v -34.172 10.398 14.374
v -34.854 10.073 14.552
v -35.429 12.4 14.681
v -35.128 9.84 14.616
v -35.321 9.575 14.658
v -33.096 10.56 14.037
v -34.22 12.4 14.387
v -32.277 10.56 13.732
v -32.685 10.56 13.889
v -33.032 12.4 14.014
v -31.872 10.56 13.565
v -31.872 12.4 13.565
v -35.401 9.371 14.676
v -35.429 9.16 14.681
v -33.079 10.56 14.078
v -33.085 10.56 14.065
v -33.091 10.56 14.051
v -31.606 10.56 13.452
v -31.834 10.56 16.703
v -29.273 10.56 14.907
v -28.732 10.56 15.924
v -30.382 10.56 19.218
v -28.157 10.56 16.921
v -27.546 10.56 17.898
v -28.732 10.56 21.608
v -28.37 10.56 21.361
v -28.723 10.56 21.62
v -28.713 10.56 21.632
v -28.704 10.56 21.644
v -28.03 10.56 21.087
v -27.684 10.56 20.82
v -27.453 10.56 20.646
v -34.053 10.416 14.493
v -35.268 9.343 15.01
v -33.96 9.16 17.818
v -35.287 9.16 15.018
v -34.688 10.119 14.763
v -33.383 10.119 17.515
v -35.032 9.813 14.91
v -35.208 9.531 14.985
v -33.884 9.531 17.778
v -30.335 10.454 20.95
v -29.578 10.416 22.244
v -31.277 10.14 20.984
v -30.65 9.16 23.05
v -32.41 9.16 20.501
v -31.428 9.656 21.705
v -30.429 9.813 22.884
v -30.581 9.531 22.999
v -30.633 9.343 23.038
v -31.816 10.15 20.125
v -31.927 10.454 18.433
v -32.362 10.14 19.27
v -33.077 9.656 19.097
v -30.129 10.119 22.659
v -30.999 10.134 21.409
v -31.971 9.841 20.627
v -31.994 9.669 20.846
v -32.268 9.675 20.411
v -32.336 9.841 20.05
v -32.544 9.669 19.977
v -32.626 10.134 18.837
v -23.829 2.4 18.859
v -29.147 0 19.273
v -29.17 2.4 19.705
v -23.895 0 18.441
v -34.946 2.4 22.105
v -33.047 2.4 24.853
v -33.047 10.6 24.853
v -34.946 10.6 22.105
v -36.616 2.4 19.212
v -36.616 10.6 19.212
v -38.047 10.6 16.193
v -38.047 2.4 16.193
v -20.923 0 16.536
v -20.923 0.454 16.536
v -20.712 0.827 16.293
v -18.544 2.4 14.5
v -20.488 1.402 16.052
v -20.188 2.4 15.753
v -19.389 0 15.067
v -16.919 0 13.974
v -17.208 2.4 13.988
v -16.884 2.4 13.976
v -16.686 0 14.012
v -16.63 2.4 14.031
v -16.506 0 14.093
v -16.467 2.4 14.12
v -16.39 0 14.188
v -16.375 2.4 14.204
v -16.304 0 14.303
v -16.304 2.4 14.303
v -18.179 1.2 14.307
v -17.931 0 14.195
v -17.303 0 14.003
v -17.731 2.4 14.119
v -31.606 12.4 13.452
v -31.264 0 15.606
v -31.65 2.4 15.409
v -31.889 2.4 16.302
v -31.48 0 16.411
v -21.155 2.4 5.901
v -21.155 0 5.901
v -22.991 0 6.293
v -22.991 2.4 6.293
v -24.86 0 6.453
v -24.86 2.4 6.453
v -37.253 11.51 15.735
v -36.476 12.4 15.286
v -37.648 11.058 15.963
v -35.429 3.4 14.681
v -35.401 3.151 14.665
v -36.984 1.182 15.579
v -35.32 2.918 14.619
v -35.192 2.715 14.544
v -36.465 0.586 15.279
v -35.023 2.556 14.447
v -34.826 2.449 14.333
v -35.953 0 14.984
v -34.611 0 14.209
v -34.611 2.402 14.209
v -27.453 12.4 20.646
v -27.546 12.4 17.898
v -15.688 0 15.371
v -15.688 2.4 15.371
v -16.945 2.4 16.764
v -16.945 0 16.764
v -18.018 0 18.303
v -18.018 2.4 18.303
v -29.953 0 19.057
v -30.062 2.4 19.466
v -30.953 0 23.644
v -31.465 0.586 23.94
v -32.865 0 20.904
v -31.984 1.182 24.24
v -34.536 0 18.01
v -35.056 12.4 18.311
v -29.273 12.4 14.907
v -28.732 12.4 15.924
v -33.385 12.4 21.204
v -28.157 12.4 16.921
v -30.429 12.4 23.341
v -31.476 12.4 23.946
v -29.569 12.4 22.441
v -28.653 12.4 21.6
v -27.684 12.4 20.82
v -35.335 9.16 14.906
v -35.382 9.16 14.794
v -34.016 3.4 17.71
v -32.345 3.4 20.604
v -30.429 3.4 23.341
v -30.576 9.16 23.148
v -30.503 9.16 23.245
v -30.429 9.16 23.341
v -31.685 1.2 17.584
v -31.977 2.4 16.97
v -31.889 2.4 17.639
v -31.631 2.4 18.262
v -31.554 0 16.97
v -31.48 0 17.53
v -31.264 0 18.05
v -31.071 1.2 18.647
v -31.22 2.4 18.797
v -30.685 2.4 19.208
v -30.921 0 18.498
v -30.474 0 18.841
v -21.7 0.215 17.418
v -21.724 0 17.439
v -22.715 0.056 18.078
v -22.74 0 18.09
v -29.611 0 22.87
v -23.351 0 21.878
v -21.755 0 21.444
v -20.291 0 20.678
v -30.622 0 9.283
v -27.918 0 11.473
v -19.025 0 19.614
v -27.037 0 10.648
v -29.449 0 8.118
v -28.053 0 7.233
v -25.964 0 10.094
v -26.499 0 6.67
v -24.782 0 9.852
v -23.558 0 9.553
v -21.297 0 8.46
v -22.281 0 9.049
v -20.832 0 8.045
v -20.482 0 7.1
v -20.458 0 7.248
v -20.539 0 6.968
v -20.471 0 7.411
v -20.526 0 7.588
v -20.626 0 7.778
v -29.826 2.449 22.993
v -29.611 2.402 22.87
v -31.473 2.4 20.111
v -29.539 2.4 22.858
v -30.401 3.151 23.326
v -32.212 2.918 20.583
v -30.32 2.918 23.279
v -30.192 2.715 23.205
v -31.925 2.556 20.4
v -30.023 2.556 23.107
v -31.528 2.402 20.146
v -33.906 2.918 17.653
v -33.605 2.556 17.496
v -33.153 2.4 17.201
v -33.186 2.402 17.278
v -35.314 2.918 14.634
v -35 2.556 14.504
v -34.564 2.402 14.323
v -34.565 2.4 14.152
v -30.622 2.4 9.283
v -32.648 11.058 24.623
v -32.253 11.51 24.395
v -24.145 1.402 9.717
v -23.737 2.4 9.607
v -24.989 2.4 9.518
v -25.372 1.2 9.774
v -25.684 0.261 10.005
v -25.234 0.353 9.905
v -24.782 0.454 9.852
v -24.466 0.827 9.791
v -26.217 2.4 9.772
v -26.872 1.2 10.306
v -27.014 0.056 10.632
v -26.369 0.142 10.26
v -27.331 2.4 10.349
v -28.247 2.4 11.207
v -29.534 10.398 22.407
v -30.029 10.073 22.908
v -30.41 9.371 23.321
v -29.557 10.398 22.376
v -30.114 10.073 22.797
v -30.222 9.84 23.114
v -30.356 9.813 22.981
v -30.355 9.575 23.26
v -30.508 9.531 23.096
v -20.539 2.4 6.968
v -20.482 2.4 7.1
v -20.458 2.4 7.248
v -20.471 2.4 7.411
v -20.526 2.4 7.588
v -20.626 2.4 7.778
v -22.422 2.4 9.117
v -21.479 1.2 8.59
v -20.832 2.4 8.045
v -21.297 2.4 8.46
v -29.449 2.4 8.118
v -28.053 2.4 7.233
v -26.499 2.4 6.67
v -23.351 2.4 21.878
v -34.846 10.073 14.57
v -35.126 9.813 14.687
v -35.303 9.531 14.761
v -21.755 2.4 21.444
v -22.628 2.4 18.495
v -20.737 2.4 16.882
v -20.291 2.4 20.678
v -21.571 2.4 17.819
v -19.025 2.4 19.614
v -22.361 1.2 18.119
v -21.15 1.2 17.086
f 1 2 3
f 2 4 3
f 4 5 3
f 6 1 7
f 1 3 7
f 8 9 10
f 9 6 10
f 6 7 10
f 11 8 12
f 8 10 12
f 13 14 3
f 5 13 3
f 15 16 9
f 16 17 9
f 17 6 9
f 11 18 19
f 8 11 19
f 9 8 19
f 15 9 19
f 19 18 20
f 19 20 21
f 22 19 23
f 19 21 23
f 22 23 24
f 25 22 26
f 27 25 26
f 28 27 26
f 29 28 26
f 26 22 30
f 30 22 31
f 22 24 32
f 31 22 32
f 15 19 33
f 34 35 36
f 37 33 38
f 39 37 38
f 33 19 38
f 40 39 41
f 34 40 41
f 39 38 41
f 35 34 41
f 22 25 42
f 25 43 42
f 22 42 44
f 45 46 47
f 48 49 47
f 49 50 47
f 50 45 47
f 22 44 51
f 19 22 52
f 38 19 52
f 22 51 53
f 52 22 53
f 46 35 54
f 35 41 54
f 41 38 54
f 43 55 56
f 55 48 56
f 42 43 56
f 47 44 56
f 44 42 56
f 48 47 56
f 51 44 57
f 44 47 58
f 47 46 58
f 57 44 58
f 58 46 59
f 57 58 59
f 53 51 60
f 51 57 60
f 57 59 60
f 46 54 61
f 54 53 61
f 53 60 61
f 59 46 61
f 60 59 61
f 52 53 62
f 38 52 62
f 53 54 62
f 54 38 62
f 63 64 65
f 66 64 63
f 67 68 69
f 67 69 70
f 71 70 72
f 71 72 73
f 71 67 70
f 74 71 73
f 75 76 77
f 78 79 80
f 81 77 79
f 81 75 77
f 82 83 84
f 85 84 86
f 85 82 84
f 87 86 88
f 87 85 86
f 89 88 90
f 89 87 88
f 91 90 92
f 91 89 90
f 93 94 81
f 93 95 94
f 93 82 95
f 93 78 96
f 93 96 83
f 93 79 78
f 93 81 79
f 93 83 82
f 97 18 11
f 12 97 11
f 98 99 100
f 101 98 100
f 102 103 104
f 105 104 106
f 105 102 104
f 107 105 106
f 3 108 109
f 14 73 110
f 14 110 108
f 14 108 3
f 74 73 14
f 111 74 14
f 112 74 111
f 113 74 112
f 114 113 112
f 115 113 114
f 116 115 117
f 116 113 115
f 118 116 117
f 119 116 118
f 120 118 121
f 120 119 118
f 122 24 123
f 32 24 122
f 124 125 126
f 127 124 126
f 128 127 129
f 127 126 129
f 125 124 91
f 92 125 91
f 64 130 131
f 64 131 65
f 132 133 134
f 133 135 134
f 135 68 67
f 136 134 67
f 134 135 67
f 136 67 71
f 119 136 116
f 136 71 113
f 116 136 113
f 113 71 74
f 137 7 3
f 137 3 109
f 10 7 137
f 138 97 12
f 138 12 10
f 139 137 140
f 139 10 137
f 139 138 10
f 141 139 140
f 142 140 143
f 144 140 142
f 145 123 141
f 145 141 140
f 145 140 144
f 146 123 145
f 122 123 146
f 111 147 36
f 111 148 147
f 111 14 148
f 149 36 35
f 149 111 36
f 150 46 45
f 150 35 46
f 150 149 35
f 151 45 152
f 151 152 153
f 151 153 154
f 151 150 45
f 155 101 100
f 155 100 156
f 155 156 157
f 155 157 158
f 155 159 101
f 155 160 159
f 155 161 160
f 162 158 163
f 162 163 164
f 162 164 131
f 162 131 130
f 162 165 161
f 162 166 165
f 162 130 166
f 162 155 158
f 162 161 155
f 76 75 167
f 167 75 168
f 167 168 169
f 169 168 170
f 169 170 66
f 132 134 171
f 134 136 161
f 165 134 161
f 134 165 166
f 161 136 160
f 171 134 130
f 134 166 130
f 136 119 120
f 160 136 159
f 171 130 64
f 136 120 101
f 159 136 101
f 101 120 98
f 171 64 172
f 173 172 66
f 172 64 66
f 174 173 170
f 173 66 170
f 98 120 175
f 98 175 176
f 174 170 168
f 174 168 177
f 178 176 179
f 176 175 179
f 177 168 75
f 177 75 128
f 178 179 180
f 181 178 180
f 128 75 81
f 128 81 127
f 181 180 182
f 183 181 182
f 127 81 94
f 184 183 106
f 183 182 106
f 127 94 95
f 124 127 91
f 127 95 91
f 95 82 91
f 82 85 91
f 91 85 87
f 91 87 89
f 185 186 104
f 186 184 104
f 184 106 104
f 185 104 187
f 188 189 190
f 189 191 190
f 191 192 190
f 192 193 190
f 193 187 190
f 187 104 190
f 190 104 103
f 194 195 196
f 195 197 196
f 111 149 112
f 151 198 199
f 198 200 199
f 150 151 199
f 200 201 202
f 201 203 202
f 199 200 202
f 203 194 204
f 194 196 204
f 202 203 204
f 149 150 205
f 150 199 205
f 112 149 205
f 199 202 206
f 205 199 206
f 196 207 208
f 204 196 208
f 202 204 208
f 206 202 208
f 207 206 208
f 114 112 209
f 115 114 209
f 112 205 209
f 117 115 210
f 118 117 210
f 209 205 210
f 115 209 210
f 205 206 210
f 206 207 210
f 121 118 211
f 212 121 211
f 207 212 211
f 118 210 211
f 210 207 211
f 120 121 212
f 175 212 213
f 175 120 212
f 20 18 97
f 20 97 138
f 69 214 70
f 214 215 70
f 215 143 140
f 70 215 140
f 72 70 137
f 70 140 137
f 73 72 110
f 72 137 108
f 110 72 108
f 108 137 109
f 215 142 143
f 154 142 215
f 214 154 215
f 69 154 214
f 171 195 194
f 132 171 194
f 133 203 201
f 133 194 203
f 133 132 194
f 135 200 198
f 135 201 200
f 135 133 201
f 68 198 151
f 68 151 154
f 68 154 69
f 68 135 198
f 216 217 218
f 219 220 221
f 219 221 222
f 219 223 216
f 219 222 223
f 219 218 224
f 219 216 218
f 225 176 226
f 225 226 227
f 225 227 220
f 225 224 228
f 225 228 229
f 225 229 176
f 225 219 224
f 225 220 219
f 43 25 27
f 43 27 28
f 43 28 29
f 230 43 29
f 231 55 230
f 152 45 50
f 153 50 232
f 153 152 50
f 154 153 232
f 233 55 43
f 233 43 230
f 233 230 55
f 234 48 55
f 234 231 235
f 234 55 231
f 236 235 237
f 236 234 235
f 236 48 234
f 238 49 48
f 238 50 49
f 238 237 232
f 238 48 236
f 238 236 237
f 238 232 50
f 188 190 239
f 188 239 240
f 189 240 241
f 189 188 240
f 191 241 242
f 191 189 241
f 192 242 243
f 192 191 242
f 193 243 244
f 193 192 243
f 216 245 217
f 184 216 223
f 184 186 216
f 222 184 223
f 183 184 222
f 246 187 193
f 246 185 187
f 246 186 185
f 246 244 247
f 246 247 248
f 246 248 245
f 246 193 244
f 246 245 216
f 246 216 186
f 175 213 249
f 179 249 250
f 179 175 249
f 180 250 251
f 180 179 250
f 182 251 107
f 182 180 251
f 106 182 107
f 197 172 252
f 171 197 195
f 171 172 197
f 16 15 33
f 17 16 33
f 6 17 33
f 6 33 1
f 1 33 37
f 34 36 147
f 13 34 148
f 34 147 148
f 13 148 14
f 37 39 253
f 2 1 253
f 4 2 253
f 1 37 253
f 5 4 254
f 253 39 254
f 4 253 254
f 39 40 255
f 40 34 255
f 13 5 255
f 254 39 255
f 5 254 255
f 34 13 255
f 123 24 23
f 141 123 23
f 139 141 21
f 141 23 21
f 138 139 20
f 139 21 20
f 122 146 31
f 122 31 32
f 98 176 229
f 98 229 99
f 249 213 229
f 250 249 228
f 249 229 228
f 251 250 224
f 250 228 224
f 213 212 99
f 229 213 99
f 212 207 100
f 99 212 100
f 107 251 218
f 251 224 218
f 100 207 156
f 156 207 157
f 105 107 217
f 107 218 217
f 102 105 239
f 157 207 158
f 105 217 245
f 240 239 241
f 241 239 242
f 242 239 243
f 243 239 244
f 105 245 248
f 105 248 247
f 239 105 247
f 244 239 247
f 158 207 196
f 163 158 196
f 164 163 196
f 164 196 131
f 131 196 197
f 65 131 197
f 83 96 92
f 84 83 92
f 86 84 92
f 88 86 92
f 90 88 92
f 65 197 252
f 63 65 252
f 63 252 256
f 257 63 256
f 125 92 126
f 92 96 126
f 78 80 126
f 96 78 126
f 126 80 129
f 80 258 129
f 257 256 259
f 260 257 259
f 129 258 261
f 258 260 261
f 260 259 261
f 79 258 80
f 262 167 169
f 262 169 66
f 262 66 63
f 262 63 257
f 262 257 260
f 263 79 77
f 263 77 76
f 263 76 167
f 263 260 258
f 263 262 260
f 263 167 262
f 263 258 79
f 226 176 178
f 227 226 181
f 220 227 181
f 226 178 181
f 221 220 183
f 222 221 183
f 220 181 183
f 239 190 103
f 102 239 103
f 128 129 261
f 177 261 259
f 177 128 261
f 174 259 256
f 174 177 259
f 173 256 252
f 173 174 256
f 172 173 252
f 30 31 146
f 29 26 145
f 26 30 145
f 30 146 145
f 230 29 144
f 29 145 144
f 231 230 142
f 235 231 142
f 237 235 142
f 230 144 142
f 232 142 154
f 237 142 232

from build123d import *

# Parameters (mm, degrees)
EXTRUDE_1_DEPTH     = 2.4
EXTRUDE_1_DRAFT     = 10.000000000000021
EXTRUDE_2_DEPTH     = 12.4
EXTRUDE_4_DEPTH     = 2.4
EXTRUDE_START       = -1.84
EXTRUDE_3_DEPTH     = 1.84
CHAMFER_1_SIZE      = 2.4
FILLET_3_R          = 1
FILLET_4_R          = 19
CHAMFER_2_SIZE      = 1.5
CHAMFER_3_SIZE      = 1.5
FILLET_5_SIZE       = 2.4
FILLET_5_SIZE_2     = 1.4
FILLET_8_R          = 15
CUT_EXTRUDE_2_DEPTH = 5
FILLET_6_DEPTH      = 2.4
FILLET_7_DEPTH      = 2.4
CHAMFER_4_SIZE      = 1.8


with BuildPart() as part:
    # 草图1 → 凸台-拉伸1 (with draft: the straight prism first)
    with BuildSketch(Plane(origin=(0, 0, 0), x_dir=(1, 0, 0), z_dir=(0, 1, 0))):
        with BuildLine():
            Line((-8, -10.39230484541326), (-13.000000000000005, -1.7320508075688719))
            Line((-13.000000000000005, -1.7320508075688719), (-21.967816979362475, -6.909622354647092))
            Line((-21.967816979362475, -6.909622354647092), (-22.707399570917065, -6.711454425652112))
            ThreePointArc((-22.707399570917065, -6.711454425652112), (-27.04566788326862, -6.825066693061728), (-30.6221750608845, -9.283130179980438))
            Line((-30.6221750608845, -9.283130179980438), (-34.43427486961312, -13.990668154170681))
            Line((-34.43427486961312, -13.990668154170681), (-34.61139932518726, -14.209398025530225))
            Line((-34.61139932518726, -14.209398025530225), (-35.428587503869785, -14.681201840470763))
            ThreePointArc((-35.428587503869785, -14.681201840470763), (-33.21207423513341, -19.174999999999695), (-30.428587503869863, -23.341455878315195))
            Line((-30.428587503869863, -23.341455878315195), (-29.611399325157414, -22.86965206335739))
            Line((-29.611399325157414, -22.86965206335739), (-29.333411472153603, -22.825622720870605))
            Line((-29.333411472153603, -22.825622720870605), (-23.35051542170495, -21.878016642325832))
            ThreePointArc((-23.35051542170495, -21.878016642325832), (-19.4335158344601, -20.009702780252802), (-17.165989990997385, -16.309458328474033))
            Line((-17.165989990997385, -16.309458328474033), (-16.967816979363704, -15.569876392492032))
            Line((-16.967816979363704, -15.569876392492032), (-8, -10.39230484541326))
        make_face()
        with BuildLine():
            Line((-27.917710857810967, -11.473169762795624), (-31.26430328260419, -15.605855608999667))
            Line((-31.26430328260419, -15.605855608999667), (-31.480162480983196, -16.41144743799068))
            ThreePointArc((-31.480162480983196, -16.41144743799068), (-31.264379416774442, -18.05049776957139), (-29.95281180657393, -19.056896658743568))
            Line((-29.95281180657393, -19.056896658743568), (-29.147219046463054, -19.272753069842064))
            Line((-29.147219046463054, -19.272753069842064), (-23.894912087940103, -18.440861965883116))
            ThreePointArc((-23.894912087940103, -18.440861965883116), (-21.762087000118, -17.42355577622036), (-20.527408297941975, -15.40875473364509))
            Line((-20.527408297941975, -15.40875473364509), (-19.958845574370134, -13.286877913181291))
            ThreePointArc((-19.958845574370134, -13.286877913181291), (-20.174626779333174, -11.64782603948194), (-21.486196868626088, -10.641428268238217))
            Line((-21.486196868626088, -10.641428268238217), (-23.608077089277337, -10.072879719767714))
            ThreePointArc((-23.608077089277337, -10.072879719767714), (-25.970285289887677, -10.134742247833366), (-27.917710857810967, -11.473169762795624))
        make_face(mode=Mode.SUBTRACT)
    extrude(amount=EXTRUDE_1_DEPTH)
    # 凸台-拉伸1: the draft: its side faces are tilted about the plane it starts from
    extrude_1_sides = [part.faces().sort_by_distance(p)[0] for p in [
        (-12.48390849, 1.2, 12.981090619),
        (-29.59100707, 1.2, 13.539512686),
        (-31.372232882, 1.2, 16.008651523),
        (-31.264379417, 1.2, 18.05049777),
        (-29.550015427, 1.2, 19.164824864),
        (-26.521065567, 1.2, 18.856807518),
        (-21.762087, 1.2, 17.423555776),
        (-20.243126936, 1.2, 14.347816323),
        (-20.174626779, 1.2, 11.647826039),
        (-22.547136979, 1.2, 10.357153994),
        (-25.97028529, 1.2, 10.134742248),
        (-19.433515834, 1.2, 20.00970278),
        (-26.480957373, 1.2, 22.373834353),
        (-30.019993415, 1.2, 23.105553971),
        (-33.212074235, 1.2, 19.175),
        (-35.019993415, 1.2, 14.445299933),
        (-32.616787193, 1.2, 11.746264103),
        (-27.045667883, 1.2, 6.825066693),
        (-22.337608275, 1.2, 6.81053839),
        (-17.48390849, 1.2, 4.320836581),
        (-10.5, 1.2, 6.062177826),
        (-17.066903485, 1.2, 15.93966736),
    ]]
    draft(extrude_1_sides, Plane(origin=(0, 0, 0), x_dir=(1, 0, 0), z_dir=(0, 1, 0)), EXTRUDE_1_DRAFT)



with BuildPart() as body_2:
    # 草图3 → 凸台-拉伸2 (new body)
    with BuildSketch(Plane.XZ):
        with BuildLine():
            Line((-30.428587503869863, 23.341455878315195), (-33.04738914463361, 24.853421710564383))
            ThreePointArc((-33.04738914463361, 24.853421710564383), (-35.81015044648663, 20.67499999999986), (-38.04738914463341, 16.193167672720275))
            Line((-38.04738914463341, 16.193167672720275), (-35.42858750386978, 14.681201840470765))
            ThreePointArc((-35.42858750386978, 14.681201840470765), (-33.21207423513341, 19.17499999999969), (-30.428587503869863, 23.341455878315195))
        make_face()
    extrude(amount=-EXTRUDE_2_DEPTH)


with BuildPart() as part_1:
    add(part.part)

    add(body_2.part)  # 凸台-拉伸4 merges body 2
    # 草图2 → 凸台-拉伸4 (add)
    with BuildSketch(Plane.XZ):
        with BuildLine():
            Line((-13.000000000000005, 1.7320508075688719), (-8, 10.39230484541326))
            Line((-8, 10.39230484541326), (-16.967816979363704, 15.569876392492032))
            Line((-16.967816979363704, 15.569876392492032), (-17.165989990997385, 16.309458328474033))
            ThreePointArc((-17.165989990997385, 16.309458328474033), (-19.433515834460025, 20.009702780252884), (-23.35051542170494, 21.878016642325914))
            Line((-23.35051542170494, 21.878016642325914), (-29.611399325157414, 22.86965206335739))
            Line((-29.611399325157414, 22.86965206335739), (-30.428587503869863, 23.341455878315195))
            ThreePointArc((-30.428587503869863, 23.341455878315195), (-33.21207423513341, 19.17499999999969), (-35.428587503869785, 14.681201840470749))
            Line((-35.428587503869785, 14.681201840470749), (-34.61139932518726, 14.209398025530225))
            Line((-34.61139932518726, 14.209398025530225), (-30.6221750608845, 9.283130179980438))
            ThreePointArc((-30.6221750608845, 9.283130179980438), (-27.04566788326878, 6.825066693061228), (-22.707399570916962, 6.7114544256517314))
            Line((-22.707399570916962, 6.7114544256517314), (-21.967816979362475, 6.909622354647092))
            Line((-21.967816979362475, 6.909622354647092), (-13.000000000000005, 1.7320508075688719))
        make_face()
        Polygon((-28.267922287633624, 9.69566060346451), (-32.99491205073382, 15.569876392492032), (-31.81295668178173, 19.594100965997992), (-26.34681601079053, 20.919608689289614), (-19.04027200355443, 17.12116385307054), (-18.489608424453053, 9.956624945753184), (-26.729419610491885, 8.295337377312261), align=None, mode=Mode.SUBTRACT)
    extrude(amount=-EXTRUDE_4_DEPTH)

    # 草图4 → 凸台-拉伸3 (add)
    with BuildSketch(Plane(origin=(0, 12.4, 0), x_dir=(1, 0, 0), z_dir=(0, 1, 0)).offset(EXTRUDE_START)):
        with BuildLine():
            Line((-30.226281339811546, -12.864463314361807), (-38.04738914463341, -16.19316767272028))
            ThreePointArc((-38.04738914463341, -16.19316767272028), (-35.81015044648664, -20.674999999999862), (-33.04738914463361, -24.853421710564383))
            Line((-33.04738914463361, -24.853421710564383), (-26.254092706196243, -19.74449584503119))
            ThreePointArc((-26.254092706196243, -19.74449584503119), (-28.4489345143189, -16.424999999999862), (-30.226281339811546, -12.864463314361807))
        make_face()
    extrude(amount=EXTRUDE_3_DEPTH)

    # 倒角1
    chamfer_1_edges = [part_1.edges().sort_by_distance(p)[0] for p in [
        (-35.81015044648664, 0, 20.674999999999848),
    ]]
    chamfer(chamfer_1_edges, length=CHAMFER_1_SIZE)

    # 圆角3
    fillet_3_edges = [part_1.edges().sort_by_distance(p)[0] for p in [
        (-33.21207423513341, 2.4, 19.174999999999685),
    ]]
    fillet(fillet_3_edges, radius=FILLET_3_R)

    # 圆角4
    # the kernel refuses this fillet: 19 mm, written as the material it adds along each edge
    with BuildSketch(Plane(origin=(-30.64975510753807, 12.4, 23.050271405082075), x_dir=(0.6048533830099544, 0, 0.7963368540143131), z_dir=(0, -1, 0))) as fillet_4_piece_1:
        with BuildLine():
            CenterArc((19.01747725145387, -3.620707526685834), FILLET_4_R, 169.01432561321406, 11.258823825178695)
            Line((0.01769316413072922, -3.711286967523243), (0, 0))
            ThreePointArc((0, 0), (0.1828274503215999, 0.00043580269250474), (0.36565490064319695, 1e-17))
        make_face()
    extrude(amount=1.8399999999999999)
    with BuildSketch(Plane(origin=(-35.28699815469627, 12.4, 15.018330840358463), x_dir=(-0.38722125404118524, 0, -0.9219868222587414), z_dir=(0, -1, 0))) as fillet_4_piece_2:
        with BuildLine():
            CenterArc((19.01747725145391, 3.620707526687544), FILLET_4_R, 179.7268505616068, 11.258823825184436)
            Line((0.01769316413076899, 3.7112869675251012), (0, 0))
            ThreePointArc((0, 0), (0.1828274503217857, -0.00043580269250211), (0.36565490064356865, -1e-17))
        make_face()
    extrude(amount=1.8399999999999999)

    # 倒角2
    # the kernel refuses this chamfer: 2.14222201, 1.5 mm, written as the material it takes off along each edge
    with BuildSketch(Plane(origin=(-30.226281339811543, 4.744273175478047, 12.864463314361808), x_dir=(-0.9201303299790425, 0, 0.3916122774539359), z_dir=(0, 1, 0))) as chamfer_2_piece_1:
        with BuildLine():
            Line((CHAMFER_2_SIZE, 1e-17), (-0.07732795533825856, 2.2526577753949484))
            ThreePointArc((-0.07732795533825856, 2.2526577753949484), (-0.02059122506408261, 1.1629357197030856), (0, 0))
            Line((0, 0), (CHAMFER_2_SIZE, 1e-17))
        make_face()
    extrude(amount=13.471453649043909, mode=Mode.SUBTRACT)

    # 倒角3
    # the kernel refuses this chamfer: 2.14222201, 1.5 mm, written as the material it takes off along each edge
    with BuildSketch(Plane(origin=(-26.254092706196246, 4.744273175477979, 19.74449584503119), x_dir=(-0.5732775613281392, 0, -0.8193612375977165), z_dir=(0, 1, 0))) as chamfer_3_piece_1:
        with BuildLine():
            Line((2.253984619673398, -1.7e-16), (-CHAMFER_3_SIZE * 0.0343072240437, CHAMFER_3_SIZE * 0.999411333925))
            Line((-CHAMFER_3_SIZE * 0.0343072240437, CHAMFER_3_SIZE * 0.999411333925), (0, 0))
            ThreePointArc((0, 0), (1.1629575666695002, 0.0193179925758491), (2.253984619673398, -1.7e-16))
        make_face()
    extrude(amount=13.471453649044044, mode=Mode.SUBTRACT)

    # 圆角5
    # a fillet whose section is not a circle: 2.4, 1.4 mm, written as the material it adds along each edge
    with BuildSketch(Plane(origin=(-2.0606e-13, 10.56, 1.3323e-13), x_dir=(-0.7992113456985149, 0, 0.601050101827434), z_dir=(0.601050101827434, 0, 0.7992113456985149))) as fillet_5_piece_1:
        with BuildLine():
            Bezier((38.34999999999976 - FILLET_5_SIZE, 0), (38.34999999999976, 0), (38.34999999999976, FILLET_5_SIZE_2), weights=[1, 0.7071067811865476, 1])
            Line((38.34999999999976, FILLET_5_SIZE_2), (38.34999999999976, 0))
            Line((38.34999999999976, 0), (38.34999999999976 - FILLET_5_SIZE, 0))
        make_face()
    revolve(axis=Axis((-2.0606e-13, 10.56, 1.3323e-13), (0, -1, 0)), revolution_arc=13.890285454944133)
    with BuildSketch(Plane(origin=(-3.461387621e-08, 10.56, 2.627939821e-08), x_dir=(-0.7992113457016207, 0, 0.6010501018233042), z_dir=(-0.6010501018233042, 0, -0.7992113457016207))) as fillet_5_piece_2_section:
        with BuildLine():
            Bezier((38.34999995654087 - FILLET_5_SIZE, 0), (38.34999995654051, 0), (38.34999995654051, -FILLET_5_SIZE_2), weights=[1, 0.7071067811865476, 1])
            Line((38.34999995654051, -FILLET_5_SIZE_2), (38.34999995654087, 0))
            Line((38.34999995654087, 0), (38.34999995654087 - FILLET_5_SIZE, 0))
        make_face()
    fillet_5_piece_2 = revolve(axis=Axis((-3.461387621e-08, 10.56, 2.627939821e-08), (0, 1, 0)), revolution_arc=9.510436623291234, mode=Mode.PRIVATE)
    fillet_5_piece_2 = fillet_5_piece_2 - Plane(origin=(-16.263666814571195, 10.56, 36.004592214384765), x_dir=(0.6048533830101342, 0, 0.7963368540141766), z_dir=(0, 1, 0)) * Cylinder(19, 154, mode=Mode.PRIVATE)
    fillet_5_piece_2 = split(fillet_5_piece_2, bisect_by=Plane(origin=(2.499999962665584, 10.56, 4.330127040493212), z_dir=(-0.4999999999996767, 0, -0.8660254037846254)), keep=Keep.TOP, mode=Mode.PRIVATE)
    add(fillet_5_piece_2)
    with BuildSketch(Plane(origin=(-4.006483323e-08, 10.56, 1.683765483e-08), x_dir=(-0.9201303299770334, 0, 0.39161227745865645), z_dir=(0.39161227745865645, 0, 0.9201303299770334))) as fillet_5_piece_3_section:
        with BuildLine():
            Bezier((38.34999995654088 - FILLET_5_SIZE, 0), (38.34999995654086, 0), (38.34999995654086, FILLET_5_SIZE_2), weights=[1, 0.7071067811865476, 1])
            Line((38.34999995654086, FILLET_5_SIZE_2), (38.34999995654088, 0))
            Line((38.34999995654088, 0), (38.34999995654088 - FILLET_5_SIZE, 0))
        make_face()
    fillet_5_piece_3 = revolve(axis=Axis((-4.006483323e-08, 10.56, 1.683765483e-08), (0, -1, 0)), revolution_arc=9.510436623292696, mode=Mode.PRIVATE)
    fillet_5_piece_3 = fillet_5_piece_3 - Plane(origin=(-39.312724917839226, 10.56, -3.9175474870895535), x_dir=(-0.38722125404093544, 0, -0.9219868222588462), z_dir=(0, 1, 0)) * Cylinder(19, 154, mode=Mode.PRIVATE)
    fillet_5_piece_3 = split(fillet_5_piece_3, bisect_by=Plane(origin=(-2.5000000373308557, 10.56, -4.330126997352951), z_dir=(0.4999999999996709, 0, 0.8660254037846287)), keep=Keep.TOP, mode=Mode.PRIVATE)
    add(fillet_5_piece_3)

    # 圆角8
    fillet_8_edges = [part_1.edges().sort_by_distance(p)[0] for p in [
        (-16.967816979363704, 1.2, 15.569876392492032),
        (-21.967816979362475, 1.2, 6.909622354647092),
    ]]
    fillet(fillet_8_edges, radius=FILLET_8_R)

    # 草图5 → 切除-拉伸2 (cut)
    with BuildSketch(Plane.XZ):
        with BuildLine():
            Line((-29.147219046463054, 19.272753069842064), (-31.26430328260419, 15.605855608999667))
            Line((-31.26430328260419, 15.605855608999667), (-27.917710857810967, 11.473169762795624))
            ThreePointArc((-27.917710857810967, 11.473169762795624), (-26.519580592002317, 10.334215480262145), (-24.78185492305829, 9.852245981886409))
            ThreePointArc((-24.78185492305829, 9.852245981886409), (-22.06180246526334, 9.58692328939854), (-19.411053683835984, 8.921632073413566))
            Line((-19.411053683835984, 8.921632073413566), (-21.15527408053382, 5.900553726782096))
            Line((-21.15527408053382, 5.900553726782096), (-15.208253993285949, -4.420406034748125))
            Line((-15.208253993285949, -4.420406034748125), (0.1921696049414131, 10.177783304028027))
            Line((0.1921696049414131, 10.177783304028027), (-15.687666464212418, 15.370727913953607))
            Line((-15.687666464212418, 15.370727913953607), (-17.43188686086262, 12.34964956740465))
            ThreePointArc((-17.43188686086262, 12.34964956740465), (-19.33342034539163, 14.31261974261085), (-20.923222766188925, 16.535592923816857))
            ThreePointArc((-20.923222766188925, 16.535592923816857), (-22.209483528439453, 17.799522767055162), (-23.894912087940103, 18.440861965883116))
            Line((-23.894912087940103, 18.440861965883116), (-29.147219046463054, 19.272753069842064))
        make_face()
    extrude(amount=-CUT_EXTRUDE_2_DEPTH, mode=Mode.SUBTRACT)

    # 圆角6: read off the stored shape, not the designer's step
    # 圆角6 outline → 圆角6 (cut)
    with BuildSketch(Plane(origin=(0, 0, 0), x_dir=(1, 0, 0), z_dir=(0, 1, 0))):
        with BuildLine():
            Line((-19.411053684, -8.921632073), (-20.538770468, -6.968369307))
            add(Edge.make_bspline(
                [(-20.538770468, -6.968369307), (-19.4215814226651, -8.903397494873008), (-24.781854923, -9.852245982)],
                knots=[0, 0, 0, 1, 1, 1], degree=2, weights=[1, 0.573849647048003, 1]))
            ThreePointArc((-24.781854923, -9.852245982), (-22.061802466, -9.586923289), (-19.411053684, -8.921632073))
        make_face()
    extrude(amount=FILLET_6_DEPTH, mode=Mode.SUBTRACT)

    # 圆角7: read off the stored shape, not the designer's step
    # 圆角7 outline → 圆角7 (cut)
    with BuildSketch(Plane(origin=(0, 0, 0), x_dir=(1, 0, 0), z_dir=(0, 1, 0))):
        with BuildLine():
            ThreePointArc((-17.431886861, -12.349649567), (-19.333420346, -14.312619744), (-20.923222767, -16.535592926))
            add(Edge.make_bspline(
                [(-20.923222767, -16.535592926), (-17.4213591171029, -12.3678841544852), (-16.304170077, -14.302912333)],
                knots=[0, 0, 0, 1, 1, 1], degree=2, weights=[1, 0.573849647800654, 1]))
            Line((-16.304170077, -14.302912333), (-17.431886861, -12.349649567))
        make_face()
    extrude(amount=FILLET_7_DEPTH, mode=Mode.SUBTRACT)

    # 倒角4
    chamfer_4_edges = [part_1.edges().sort_by_distance(p)[0] for p in [
        (-35.81015044648664, 12.4, 20.674999999999848),
    ]]
    chamfer(chamfer_4_edges, length=CHAMFER_4_SIZE)


solid = part_1.part
